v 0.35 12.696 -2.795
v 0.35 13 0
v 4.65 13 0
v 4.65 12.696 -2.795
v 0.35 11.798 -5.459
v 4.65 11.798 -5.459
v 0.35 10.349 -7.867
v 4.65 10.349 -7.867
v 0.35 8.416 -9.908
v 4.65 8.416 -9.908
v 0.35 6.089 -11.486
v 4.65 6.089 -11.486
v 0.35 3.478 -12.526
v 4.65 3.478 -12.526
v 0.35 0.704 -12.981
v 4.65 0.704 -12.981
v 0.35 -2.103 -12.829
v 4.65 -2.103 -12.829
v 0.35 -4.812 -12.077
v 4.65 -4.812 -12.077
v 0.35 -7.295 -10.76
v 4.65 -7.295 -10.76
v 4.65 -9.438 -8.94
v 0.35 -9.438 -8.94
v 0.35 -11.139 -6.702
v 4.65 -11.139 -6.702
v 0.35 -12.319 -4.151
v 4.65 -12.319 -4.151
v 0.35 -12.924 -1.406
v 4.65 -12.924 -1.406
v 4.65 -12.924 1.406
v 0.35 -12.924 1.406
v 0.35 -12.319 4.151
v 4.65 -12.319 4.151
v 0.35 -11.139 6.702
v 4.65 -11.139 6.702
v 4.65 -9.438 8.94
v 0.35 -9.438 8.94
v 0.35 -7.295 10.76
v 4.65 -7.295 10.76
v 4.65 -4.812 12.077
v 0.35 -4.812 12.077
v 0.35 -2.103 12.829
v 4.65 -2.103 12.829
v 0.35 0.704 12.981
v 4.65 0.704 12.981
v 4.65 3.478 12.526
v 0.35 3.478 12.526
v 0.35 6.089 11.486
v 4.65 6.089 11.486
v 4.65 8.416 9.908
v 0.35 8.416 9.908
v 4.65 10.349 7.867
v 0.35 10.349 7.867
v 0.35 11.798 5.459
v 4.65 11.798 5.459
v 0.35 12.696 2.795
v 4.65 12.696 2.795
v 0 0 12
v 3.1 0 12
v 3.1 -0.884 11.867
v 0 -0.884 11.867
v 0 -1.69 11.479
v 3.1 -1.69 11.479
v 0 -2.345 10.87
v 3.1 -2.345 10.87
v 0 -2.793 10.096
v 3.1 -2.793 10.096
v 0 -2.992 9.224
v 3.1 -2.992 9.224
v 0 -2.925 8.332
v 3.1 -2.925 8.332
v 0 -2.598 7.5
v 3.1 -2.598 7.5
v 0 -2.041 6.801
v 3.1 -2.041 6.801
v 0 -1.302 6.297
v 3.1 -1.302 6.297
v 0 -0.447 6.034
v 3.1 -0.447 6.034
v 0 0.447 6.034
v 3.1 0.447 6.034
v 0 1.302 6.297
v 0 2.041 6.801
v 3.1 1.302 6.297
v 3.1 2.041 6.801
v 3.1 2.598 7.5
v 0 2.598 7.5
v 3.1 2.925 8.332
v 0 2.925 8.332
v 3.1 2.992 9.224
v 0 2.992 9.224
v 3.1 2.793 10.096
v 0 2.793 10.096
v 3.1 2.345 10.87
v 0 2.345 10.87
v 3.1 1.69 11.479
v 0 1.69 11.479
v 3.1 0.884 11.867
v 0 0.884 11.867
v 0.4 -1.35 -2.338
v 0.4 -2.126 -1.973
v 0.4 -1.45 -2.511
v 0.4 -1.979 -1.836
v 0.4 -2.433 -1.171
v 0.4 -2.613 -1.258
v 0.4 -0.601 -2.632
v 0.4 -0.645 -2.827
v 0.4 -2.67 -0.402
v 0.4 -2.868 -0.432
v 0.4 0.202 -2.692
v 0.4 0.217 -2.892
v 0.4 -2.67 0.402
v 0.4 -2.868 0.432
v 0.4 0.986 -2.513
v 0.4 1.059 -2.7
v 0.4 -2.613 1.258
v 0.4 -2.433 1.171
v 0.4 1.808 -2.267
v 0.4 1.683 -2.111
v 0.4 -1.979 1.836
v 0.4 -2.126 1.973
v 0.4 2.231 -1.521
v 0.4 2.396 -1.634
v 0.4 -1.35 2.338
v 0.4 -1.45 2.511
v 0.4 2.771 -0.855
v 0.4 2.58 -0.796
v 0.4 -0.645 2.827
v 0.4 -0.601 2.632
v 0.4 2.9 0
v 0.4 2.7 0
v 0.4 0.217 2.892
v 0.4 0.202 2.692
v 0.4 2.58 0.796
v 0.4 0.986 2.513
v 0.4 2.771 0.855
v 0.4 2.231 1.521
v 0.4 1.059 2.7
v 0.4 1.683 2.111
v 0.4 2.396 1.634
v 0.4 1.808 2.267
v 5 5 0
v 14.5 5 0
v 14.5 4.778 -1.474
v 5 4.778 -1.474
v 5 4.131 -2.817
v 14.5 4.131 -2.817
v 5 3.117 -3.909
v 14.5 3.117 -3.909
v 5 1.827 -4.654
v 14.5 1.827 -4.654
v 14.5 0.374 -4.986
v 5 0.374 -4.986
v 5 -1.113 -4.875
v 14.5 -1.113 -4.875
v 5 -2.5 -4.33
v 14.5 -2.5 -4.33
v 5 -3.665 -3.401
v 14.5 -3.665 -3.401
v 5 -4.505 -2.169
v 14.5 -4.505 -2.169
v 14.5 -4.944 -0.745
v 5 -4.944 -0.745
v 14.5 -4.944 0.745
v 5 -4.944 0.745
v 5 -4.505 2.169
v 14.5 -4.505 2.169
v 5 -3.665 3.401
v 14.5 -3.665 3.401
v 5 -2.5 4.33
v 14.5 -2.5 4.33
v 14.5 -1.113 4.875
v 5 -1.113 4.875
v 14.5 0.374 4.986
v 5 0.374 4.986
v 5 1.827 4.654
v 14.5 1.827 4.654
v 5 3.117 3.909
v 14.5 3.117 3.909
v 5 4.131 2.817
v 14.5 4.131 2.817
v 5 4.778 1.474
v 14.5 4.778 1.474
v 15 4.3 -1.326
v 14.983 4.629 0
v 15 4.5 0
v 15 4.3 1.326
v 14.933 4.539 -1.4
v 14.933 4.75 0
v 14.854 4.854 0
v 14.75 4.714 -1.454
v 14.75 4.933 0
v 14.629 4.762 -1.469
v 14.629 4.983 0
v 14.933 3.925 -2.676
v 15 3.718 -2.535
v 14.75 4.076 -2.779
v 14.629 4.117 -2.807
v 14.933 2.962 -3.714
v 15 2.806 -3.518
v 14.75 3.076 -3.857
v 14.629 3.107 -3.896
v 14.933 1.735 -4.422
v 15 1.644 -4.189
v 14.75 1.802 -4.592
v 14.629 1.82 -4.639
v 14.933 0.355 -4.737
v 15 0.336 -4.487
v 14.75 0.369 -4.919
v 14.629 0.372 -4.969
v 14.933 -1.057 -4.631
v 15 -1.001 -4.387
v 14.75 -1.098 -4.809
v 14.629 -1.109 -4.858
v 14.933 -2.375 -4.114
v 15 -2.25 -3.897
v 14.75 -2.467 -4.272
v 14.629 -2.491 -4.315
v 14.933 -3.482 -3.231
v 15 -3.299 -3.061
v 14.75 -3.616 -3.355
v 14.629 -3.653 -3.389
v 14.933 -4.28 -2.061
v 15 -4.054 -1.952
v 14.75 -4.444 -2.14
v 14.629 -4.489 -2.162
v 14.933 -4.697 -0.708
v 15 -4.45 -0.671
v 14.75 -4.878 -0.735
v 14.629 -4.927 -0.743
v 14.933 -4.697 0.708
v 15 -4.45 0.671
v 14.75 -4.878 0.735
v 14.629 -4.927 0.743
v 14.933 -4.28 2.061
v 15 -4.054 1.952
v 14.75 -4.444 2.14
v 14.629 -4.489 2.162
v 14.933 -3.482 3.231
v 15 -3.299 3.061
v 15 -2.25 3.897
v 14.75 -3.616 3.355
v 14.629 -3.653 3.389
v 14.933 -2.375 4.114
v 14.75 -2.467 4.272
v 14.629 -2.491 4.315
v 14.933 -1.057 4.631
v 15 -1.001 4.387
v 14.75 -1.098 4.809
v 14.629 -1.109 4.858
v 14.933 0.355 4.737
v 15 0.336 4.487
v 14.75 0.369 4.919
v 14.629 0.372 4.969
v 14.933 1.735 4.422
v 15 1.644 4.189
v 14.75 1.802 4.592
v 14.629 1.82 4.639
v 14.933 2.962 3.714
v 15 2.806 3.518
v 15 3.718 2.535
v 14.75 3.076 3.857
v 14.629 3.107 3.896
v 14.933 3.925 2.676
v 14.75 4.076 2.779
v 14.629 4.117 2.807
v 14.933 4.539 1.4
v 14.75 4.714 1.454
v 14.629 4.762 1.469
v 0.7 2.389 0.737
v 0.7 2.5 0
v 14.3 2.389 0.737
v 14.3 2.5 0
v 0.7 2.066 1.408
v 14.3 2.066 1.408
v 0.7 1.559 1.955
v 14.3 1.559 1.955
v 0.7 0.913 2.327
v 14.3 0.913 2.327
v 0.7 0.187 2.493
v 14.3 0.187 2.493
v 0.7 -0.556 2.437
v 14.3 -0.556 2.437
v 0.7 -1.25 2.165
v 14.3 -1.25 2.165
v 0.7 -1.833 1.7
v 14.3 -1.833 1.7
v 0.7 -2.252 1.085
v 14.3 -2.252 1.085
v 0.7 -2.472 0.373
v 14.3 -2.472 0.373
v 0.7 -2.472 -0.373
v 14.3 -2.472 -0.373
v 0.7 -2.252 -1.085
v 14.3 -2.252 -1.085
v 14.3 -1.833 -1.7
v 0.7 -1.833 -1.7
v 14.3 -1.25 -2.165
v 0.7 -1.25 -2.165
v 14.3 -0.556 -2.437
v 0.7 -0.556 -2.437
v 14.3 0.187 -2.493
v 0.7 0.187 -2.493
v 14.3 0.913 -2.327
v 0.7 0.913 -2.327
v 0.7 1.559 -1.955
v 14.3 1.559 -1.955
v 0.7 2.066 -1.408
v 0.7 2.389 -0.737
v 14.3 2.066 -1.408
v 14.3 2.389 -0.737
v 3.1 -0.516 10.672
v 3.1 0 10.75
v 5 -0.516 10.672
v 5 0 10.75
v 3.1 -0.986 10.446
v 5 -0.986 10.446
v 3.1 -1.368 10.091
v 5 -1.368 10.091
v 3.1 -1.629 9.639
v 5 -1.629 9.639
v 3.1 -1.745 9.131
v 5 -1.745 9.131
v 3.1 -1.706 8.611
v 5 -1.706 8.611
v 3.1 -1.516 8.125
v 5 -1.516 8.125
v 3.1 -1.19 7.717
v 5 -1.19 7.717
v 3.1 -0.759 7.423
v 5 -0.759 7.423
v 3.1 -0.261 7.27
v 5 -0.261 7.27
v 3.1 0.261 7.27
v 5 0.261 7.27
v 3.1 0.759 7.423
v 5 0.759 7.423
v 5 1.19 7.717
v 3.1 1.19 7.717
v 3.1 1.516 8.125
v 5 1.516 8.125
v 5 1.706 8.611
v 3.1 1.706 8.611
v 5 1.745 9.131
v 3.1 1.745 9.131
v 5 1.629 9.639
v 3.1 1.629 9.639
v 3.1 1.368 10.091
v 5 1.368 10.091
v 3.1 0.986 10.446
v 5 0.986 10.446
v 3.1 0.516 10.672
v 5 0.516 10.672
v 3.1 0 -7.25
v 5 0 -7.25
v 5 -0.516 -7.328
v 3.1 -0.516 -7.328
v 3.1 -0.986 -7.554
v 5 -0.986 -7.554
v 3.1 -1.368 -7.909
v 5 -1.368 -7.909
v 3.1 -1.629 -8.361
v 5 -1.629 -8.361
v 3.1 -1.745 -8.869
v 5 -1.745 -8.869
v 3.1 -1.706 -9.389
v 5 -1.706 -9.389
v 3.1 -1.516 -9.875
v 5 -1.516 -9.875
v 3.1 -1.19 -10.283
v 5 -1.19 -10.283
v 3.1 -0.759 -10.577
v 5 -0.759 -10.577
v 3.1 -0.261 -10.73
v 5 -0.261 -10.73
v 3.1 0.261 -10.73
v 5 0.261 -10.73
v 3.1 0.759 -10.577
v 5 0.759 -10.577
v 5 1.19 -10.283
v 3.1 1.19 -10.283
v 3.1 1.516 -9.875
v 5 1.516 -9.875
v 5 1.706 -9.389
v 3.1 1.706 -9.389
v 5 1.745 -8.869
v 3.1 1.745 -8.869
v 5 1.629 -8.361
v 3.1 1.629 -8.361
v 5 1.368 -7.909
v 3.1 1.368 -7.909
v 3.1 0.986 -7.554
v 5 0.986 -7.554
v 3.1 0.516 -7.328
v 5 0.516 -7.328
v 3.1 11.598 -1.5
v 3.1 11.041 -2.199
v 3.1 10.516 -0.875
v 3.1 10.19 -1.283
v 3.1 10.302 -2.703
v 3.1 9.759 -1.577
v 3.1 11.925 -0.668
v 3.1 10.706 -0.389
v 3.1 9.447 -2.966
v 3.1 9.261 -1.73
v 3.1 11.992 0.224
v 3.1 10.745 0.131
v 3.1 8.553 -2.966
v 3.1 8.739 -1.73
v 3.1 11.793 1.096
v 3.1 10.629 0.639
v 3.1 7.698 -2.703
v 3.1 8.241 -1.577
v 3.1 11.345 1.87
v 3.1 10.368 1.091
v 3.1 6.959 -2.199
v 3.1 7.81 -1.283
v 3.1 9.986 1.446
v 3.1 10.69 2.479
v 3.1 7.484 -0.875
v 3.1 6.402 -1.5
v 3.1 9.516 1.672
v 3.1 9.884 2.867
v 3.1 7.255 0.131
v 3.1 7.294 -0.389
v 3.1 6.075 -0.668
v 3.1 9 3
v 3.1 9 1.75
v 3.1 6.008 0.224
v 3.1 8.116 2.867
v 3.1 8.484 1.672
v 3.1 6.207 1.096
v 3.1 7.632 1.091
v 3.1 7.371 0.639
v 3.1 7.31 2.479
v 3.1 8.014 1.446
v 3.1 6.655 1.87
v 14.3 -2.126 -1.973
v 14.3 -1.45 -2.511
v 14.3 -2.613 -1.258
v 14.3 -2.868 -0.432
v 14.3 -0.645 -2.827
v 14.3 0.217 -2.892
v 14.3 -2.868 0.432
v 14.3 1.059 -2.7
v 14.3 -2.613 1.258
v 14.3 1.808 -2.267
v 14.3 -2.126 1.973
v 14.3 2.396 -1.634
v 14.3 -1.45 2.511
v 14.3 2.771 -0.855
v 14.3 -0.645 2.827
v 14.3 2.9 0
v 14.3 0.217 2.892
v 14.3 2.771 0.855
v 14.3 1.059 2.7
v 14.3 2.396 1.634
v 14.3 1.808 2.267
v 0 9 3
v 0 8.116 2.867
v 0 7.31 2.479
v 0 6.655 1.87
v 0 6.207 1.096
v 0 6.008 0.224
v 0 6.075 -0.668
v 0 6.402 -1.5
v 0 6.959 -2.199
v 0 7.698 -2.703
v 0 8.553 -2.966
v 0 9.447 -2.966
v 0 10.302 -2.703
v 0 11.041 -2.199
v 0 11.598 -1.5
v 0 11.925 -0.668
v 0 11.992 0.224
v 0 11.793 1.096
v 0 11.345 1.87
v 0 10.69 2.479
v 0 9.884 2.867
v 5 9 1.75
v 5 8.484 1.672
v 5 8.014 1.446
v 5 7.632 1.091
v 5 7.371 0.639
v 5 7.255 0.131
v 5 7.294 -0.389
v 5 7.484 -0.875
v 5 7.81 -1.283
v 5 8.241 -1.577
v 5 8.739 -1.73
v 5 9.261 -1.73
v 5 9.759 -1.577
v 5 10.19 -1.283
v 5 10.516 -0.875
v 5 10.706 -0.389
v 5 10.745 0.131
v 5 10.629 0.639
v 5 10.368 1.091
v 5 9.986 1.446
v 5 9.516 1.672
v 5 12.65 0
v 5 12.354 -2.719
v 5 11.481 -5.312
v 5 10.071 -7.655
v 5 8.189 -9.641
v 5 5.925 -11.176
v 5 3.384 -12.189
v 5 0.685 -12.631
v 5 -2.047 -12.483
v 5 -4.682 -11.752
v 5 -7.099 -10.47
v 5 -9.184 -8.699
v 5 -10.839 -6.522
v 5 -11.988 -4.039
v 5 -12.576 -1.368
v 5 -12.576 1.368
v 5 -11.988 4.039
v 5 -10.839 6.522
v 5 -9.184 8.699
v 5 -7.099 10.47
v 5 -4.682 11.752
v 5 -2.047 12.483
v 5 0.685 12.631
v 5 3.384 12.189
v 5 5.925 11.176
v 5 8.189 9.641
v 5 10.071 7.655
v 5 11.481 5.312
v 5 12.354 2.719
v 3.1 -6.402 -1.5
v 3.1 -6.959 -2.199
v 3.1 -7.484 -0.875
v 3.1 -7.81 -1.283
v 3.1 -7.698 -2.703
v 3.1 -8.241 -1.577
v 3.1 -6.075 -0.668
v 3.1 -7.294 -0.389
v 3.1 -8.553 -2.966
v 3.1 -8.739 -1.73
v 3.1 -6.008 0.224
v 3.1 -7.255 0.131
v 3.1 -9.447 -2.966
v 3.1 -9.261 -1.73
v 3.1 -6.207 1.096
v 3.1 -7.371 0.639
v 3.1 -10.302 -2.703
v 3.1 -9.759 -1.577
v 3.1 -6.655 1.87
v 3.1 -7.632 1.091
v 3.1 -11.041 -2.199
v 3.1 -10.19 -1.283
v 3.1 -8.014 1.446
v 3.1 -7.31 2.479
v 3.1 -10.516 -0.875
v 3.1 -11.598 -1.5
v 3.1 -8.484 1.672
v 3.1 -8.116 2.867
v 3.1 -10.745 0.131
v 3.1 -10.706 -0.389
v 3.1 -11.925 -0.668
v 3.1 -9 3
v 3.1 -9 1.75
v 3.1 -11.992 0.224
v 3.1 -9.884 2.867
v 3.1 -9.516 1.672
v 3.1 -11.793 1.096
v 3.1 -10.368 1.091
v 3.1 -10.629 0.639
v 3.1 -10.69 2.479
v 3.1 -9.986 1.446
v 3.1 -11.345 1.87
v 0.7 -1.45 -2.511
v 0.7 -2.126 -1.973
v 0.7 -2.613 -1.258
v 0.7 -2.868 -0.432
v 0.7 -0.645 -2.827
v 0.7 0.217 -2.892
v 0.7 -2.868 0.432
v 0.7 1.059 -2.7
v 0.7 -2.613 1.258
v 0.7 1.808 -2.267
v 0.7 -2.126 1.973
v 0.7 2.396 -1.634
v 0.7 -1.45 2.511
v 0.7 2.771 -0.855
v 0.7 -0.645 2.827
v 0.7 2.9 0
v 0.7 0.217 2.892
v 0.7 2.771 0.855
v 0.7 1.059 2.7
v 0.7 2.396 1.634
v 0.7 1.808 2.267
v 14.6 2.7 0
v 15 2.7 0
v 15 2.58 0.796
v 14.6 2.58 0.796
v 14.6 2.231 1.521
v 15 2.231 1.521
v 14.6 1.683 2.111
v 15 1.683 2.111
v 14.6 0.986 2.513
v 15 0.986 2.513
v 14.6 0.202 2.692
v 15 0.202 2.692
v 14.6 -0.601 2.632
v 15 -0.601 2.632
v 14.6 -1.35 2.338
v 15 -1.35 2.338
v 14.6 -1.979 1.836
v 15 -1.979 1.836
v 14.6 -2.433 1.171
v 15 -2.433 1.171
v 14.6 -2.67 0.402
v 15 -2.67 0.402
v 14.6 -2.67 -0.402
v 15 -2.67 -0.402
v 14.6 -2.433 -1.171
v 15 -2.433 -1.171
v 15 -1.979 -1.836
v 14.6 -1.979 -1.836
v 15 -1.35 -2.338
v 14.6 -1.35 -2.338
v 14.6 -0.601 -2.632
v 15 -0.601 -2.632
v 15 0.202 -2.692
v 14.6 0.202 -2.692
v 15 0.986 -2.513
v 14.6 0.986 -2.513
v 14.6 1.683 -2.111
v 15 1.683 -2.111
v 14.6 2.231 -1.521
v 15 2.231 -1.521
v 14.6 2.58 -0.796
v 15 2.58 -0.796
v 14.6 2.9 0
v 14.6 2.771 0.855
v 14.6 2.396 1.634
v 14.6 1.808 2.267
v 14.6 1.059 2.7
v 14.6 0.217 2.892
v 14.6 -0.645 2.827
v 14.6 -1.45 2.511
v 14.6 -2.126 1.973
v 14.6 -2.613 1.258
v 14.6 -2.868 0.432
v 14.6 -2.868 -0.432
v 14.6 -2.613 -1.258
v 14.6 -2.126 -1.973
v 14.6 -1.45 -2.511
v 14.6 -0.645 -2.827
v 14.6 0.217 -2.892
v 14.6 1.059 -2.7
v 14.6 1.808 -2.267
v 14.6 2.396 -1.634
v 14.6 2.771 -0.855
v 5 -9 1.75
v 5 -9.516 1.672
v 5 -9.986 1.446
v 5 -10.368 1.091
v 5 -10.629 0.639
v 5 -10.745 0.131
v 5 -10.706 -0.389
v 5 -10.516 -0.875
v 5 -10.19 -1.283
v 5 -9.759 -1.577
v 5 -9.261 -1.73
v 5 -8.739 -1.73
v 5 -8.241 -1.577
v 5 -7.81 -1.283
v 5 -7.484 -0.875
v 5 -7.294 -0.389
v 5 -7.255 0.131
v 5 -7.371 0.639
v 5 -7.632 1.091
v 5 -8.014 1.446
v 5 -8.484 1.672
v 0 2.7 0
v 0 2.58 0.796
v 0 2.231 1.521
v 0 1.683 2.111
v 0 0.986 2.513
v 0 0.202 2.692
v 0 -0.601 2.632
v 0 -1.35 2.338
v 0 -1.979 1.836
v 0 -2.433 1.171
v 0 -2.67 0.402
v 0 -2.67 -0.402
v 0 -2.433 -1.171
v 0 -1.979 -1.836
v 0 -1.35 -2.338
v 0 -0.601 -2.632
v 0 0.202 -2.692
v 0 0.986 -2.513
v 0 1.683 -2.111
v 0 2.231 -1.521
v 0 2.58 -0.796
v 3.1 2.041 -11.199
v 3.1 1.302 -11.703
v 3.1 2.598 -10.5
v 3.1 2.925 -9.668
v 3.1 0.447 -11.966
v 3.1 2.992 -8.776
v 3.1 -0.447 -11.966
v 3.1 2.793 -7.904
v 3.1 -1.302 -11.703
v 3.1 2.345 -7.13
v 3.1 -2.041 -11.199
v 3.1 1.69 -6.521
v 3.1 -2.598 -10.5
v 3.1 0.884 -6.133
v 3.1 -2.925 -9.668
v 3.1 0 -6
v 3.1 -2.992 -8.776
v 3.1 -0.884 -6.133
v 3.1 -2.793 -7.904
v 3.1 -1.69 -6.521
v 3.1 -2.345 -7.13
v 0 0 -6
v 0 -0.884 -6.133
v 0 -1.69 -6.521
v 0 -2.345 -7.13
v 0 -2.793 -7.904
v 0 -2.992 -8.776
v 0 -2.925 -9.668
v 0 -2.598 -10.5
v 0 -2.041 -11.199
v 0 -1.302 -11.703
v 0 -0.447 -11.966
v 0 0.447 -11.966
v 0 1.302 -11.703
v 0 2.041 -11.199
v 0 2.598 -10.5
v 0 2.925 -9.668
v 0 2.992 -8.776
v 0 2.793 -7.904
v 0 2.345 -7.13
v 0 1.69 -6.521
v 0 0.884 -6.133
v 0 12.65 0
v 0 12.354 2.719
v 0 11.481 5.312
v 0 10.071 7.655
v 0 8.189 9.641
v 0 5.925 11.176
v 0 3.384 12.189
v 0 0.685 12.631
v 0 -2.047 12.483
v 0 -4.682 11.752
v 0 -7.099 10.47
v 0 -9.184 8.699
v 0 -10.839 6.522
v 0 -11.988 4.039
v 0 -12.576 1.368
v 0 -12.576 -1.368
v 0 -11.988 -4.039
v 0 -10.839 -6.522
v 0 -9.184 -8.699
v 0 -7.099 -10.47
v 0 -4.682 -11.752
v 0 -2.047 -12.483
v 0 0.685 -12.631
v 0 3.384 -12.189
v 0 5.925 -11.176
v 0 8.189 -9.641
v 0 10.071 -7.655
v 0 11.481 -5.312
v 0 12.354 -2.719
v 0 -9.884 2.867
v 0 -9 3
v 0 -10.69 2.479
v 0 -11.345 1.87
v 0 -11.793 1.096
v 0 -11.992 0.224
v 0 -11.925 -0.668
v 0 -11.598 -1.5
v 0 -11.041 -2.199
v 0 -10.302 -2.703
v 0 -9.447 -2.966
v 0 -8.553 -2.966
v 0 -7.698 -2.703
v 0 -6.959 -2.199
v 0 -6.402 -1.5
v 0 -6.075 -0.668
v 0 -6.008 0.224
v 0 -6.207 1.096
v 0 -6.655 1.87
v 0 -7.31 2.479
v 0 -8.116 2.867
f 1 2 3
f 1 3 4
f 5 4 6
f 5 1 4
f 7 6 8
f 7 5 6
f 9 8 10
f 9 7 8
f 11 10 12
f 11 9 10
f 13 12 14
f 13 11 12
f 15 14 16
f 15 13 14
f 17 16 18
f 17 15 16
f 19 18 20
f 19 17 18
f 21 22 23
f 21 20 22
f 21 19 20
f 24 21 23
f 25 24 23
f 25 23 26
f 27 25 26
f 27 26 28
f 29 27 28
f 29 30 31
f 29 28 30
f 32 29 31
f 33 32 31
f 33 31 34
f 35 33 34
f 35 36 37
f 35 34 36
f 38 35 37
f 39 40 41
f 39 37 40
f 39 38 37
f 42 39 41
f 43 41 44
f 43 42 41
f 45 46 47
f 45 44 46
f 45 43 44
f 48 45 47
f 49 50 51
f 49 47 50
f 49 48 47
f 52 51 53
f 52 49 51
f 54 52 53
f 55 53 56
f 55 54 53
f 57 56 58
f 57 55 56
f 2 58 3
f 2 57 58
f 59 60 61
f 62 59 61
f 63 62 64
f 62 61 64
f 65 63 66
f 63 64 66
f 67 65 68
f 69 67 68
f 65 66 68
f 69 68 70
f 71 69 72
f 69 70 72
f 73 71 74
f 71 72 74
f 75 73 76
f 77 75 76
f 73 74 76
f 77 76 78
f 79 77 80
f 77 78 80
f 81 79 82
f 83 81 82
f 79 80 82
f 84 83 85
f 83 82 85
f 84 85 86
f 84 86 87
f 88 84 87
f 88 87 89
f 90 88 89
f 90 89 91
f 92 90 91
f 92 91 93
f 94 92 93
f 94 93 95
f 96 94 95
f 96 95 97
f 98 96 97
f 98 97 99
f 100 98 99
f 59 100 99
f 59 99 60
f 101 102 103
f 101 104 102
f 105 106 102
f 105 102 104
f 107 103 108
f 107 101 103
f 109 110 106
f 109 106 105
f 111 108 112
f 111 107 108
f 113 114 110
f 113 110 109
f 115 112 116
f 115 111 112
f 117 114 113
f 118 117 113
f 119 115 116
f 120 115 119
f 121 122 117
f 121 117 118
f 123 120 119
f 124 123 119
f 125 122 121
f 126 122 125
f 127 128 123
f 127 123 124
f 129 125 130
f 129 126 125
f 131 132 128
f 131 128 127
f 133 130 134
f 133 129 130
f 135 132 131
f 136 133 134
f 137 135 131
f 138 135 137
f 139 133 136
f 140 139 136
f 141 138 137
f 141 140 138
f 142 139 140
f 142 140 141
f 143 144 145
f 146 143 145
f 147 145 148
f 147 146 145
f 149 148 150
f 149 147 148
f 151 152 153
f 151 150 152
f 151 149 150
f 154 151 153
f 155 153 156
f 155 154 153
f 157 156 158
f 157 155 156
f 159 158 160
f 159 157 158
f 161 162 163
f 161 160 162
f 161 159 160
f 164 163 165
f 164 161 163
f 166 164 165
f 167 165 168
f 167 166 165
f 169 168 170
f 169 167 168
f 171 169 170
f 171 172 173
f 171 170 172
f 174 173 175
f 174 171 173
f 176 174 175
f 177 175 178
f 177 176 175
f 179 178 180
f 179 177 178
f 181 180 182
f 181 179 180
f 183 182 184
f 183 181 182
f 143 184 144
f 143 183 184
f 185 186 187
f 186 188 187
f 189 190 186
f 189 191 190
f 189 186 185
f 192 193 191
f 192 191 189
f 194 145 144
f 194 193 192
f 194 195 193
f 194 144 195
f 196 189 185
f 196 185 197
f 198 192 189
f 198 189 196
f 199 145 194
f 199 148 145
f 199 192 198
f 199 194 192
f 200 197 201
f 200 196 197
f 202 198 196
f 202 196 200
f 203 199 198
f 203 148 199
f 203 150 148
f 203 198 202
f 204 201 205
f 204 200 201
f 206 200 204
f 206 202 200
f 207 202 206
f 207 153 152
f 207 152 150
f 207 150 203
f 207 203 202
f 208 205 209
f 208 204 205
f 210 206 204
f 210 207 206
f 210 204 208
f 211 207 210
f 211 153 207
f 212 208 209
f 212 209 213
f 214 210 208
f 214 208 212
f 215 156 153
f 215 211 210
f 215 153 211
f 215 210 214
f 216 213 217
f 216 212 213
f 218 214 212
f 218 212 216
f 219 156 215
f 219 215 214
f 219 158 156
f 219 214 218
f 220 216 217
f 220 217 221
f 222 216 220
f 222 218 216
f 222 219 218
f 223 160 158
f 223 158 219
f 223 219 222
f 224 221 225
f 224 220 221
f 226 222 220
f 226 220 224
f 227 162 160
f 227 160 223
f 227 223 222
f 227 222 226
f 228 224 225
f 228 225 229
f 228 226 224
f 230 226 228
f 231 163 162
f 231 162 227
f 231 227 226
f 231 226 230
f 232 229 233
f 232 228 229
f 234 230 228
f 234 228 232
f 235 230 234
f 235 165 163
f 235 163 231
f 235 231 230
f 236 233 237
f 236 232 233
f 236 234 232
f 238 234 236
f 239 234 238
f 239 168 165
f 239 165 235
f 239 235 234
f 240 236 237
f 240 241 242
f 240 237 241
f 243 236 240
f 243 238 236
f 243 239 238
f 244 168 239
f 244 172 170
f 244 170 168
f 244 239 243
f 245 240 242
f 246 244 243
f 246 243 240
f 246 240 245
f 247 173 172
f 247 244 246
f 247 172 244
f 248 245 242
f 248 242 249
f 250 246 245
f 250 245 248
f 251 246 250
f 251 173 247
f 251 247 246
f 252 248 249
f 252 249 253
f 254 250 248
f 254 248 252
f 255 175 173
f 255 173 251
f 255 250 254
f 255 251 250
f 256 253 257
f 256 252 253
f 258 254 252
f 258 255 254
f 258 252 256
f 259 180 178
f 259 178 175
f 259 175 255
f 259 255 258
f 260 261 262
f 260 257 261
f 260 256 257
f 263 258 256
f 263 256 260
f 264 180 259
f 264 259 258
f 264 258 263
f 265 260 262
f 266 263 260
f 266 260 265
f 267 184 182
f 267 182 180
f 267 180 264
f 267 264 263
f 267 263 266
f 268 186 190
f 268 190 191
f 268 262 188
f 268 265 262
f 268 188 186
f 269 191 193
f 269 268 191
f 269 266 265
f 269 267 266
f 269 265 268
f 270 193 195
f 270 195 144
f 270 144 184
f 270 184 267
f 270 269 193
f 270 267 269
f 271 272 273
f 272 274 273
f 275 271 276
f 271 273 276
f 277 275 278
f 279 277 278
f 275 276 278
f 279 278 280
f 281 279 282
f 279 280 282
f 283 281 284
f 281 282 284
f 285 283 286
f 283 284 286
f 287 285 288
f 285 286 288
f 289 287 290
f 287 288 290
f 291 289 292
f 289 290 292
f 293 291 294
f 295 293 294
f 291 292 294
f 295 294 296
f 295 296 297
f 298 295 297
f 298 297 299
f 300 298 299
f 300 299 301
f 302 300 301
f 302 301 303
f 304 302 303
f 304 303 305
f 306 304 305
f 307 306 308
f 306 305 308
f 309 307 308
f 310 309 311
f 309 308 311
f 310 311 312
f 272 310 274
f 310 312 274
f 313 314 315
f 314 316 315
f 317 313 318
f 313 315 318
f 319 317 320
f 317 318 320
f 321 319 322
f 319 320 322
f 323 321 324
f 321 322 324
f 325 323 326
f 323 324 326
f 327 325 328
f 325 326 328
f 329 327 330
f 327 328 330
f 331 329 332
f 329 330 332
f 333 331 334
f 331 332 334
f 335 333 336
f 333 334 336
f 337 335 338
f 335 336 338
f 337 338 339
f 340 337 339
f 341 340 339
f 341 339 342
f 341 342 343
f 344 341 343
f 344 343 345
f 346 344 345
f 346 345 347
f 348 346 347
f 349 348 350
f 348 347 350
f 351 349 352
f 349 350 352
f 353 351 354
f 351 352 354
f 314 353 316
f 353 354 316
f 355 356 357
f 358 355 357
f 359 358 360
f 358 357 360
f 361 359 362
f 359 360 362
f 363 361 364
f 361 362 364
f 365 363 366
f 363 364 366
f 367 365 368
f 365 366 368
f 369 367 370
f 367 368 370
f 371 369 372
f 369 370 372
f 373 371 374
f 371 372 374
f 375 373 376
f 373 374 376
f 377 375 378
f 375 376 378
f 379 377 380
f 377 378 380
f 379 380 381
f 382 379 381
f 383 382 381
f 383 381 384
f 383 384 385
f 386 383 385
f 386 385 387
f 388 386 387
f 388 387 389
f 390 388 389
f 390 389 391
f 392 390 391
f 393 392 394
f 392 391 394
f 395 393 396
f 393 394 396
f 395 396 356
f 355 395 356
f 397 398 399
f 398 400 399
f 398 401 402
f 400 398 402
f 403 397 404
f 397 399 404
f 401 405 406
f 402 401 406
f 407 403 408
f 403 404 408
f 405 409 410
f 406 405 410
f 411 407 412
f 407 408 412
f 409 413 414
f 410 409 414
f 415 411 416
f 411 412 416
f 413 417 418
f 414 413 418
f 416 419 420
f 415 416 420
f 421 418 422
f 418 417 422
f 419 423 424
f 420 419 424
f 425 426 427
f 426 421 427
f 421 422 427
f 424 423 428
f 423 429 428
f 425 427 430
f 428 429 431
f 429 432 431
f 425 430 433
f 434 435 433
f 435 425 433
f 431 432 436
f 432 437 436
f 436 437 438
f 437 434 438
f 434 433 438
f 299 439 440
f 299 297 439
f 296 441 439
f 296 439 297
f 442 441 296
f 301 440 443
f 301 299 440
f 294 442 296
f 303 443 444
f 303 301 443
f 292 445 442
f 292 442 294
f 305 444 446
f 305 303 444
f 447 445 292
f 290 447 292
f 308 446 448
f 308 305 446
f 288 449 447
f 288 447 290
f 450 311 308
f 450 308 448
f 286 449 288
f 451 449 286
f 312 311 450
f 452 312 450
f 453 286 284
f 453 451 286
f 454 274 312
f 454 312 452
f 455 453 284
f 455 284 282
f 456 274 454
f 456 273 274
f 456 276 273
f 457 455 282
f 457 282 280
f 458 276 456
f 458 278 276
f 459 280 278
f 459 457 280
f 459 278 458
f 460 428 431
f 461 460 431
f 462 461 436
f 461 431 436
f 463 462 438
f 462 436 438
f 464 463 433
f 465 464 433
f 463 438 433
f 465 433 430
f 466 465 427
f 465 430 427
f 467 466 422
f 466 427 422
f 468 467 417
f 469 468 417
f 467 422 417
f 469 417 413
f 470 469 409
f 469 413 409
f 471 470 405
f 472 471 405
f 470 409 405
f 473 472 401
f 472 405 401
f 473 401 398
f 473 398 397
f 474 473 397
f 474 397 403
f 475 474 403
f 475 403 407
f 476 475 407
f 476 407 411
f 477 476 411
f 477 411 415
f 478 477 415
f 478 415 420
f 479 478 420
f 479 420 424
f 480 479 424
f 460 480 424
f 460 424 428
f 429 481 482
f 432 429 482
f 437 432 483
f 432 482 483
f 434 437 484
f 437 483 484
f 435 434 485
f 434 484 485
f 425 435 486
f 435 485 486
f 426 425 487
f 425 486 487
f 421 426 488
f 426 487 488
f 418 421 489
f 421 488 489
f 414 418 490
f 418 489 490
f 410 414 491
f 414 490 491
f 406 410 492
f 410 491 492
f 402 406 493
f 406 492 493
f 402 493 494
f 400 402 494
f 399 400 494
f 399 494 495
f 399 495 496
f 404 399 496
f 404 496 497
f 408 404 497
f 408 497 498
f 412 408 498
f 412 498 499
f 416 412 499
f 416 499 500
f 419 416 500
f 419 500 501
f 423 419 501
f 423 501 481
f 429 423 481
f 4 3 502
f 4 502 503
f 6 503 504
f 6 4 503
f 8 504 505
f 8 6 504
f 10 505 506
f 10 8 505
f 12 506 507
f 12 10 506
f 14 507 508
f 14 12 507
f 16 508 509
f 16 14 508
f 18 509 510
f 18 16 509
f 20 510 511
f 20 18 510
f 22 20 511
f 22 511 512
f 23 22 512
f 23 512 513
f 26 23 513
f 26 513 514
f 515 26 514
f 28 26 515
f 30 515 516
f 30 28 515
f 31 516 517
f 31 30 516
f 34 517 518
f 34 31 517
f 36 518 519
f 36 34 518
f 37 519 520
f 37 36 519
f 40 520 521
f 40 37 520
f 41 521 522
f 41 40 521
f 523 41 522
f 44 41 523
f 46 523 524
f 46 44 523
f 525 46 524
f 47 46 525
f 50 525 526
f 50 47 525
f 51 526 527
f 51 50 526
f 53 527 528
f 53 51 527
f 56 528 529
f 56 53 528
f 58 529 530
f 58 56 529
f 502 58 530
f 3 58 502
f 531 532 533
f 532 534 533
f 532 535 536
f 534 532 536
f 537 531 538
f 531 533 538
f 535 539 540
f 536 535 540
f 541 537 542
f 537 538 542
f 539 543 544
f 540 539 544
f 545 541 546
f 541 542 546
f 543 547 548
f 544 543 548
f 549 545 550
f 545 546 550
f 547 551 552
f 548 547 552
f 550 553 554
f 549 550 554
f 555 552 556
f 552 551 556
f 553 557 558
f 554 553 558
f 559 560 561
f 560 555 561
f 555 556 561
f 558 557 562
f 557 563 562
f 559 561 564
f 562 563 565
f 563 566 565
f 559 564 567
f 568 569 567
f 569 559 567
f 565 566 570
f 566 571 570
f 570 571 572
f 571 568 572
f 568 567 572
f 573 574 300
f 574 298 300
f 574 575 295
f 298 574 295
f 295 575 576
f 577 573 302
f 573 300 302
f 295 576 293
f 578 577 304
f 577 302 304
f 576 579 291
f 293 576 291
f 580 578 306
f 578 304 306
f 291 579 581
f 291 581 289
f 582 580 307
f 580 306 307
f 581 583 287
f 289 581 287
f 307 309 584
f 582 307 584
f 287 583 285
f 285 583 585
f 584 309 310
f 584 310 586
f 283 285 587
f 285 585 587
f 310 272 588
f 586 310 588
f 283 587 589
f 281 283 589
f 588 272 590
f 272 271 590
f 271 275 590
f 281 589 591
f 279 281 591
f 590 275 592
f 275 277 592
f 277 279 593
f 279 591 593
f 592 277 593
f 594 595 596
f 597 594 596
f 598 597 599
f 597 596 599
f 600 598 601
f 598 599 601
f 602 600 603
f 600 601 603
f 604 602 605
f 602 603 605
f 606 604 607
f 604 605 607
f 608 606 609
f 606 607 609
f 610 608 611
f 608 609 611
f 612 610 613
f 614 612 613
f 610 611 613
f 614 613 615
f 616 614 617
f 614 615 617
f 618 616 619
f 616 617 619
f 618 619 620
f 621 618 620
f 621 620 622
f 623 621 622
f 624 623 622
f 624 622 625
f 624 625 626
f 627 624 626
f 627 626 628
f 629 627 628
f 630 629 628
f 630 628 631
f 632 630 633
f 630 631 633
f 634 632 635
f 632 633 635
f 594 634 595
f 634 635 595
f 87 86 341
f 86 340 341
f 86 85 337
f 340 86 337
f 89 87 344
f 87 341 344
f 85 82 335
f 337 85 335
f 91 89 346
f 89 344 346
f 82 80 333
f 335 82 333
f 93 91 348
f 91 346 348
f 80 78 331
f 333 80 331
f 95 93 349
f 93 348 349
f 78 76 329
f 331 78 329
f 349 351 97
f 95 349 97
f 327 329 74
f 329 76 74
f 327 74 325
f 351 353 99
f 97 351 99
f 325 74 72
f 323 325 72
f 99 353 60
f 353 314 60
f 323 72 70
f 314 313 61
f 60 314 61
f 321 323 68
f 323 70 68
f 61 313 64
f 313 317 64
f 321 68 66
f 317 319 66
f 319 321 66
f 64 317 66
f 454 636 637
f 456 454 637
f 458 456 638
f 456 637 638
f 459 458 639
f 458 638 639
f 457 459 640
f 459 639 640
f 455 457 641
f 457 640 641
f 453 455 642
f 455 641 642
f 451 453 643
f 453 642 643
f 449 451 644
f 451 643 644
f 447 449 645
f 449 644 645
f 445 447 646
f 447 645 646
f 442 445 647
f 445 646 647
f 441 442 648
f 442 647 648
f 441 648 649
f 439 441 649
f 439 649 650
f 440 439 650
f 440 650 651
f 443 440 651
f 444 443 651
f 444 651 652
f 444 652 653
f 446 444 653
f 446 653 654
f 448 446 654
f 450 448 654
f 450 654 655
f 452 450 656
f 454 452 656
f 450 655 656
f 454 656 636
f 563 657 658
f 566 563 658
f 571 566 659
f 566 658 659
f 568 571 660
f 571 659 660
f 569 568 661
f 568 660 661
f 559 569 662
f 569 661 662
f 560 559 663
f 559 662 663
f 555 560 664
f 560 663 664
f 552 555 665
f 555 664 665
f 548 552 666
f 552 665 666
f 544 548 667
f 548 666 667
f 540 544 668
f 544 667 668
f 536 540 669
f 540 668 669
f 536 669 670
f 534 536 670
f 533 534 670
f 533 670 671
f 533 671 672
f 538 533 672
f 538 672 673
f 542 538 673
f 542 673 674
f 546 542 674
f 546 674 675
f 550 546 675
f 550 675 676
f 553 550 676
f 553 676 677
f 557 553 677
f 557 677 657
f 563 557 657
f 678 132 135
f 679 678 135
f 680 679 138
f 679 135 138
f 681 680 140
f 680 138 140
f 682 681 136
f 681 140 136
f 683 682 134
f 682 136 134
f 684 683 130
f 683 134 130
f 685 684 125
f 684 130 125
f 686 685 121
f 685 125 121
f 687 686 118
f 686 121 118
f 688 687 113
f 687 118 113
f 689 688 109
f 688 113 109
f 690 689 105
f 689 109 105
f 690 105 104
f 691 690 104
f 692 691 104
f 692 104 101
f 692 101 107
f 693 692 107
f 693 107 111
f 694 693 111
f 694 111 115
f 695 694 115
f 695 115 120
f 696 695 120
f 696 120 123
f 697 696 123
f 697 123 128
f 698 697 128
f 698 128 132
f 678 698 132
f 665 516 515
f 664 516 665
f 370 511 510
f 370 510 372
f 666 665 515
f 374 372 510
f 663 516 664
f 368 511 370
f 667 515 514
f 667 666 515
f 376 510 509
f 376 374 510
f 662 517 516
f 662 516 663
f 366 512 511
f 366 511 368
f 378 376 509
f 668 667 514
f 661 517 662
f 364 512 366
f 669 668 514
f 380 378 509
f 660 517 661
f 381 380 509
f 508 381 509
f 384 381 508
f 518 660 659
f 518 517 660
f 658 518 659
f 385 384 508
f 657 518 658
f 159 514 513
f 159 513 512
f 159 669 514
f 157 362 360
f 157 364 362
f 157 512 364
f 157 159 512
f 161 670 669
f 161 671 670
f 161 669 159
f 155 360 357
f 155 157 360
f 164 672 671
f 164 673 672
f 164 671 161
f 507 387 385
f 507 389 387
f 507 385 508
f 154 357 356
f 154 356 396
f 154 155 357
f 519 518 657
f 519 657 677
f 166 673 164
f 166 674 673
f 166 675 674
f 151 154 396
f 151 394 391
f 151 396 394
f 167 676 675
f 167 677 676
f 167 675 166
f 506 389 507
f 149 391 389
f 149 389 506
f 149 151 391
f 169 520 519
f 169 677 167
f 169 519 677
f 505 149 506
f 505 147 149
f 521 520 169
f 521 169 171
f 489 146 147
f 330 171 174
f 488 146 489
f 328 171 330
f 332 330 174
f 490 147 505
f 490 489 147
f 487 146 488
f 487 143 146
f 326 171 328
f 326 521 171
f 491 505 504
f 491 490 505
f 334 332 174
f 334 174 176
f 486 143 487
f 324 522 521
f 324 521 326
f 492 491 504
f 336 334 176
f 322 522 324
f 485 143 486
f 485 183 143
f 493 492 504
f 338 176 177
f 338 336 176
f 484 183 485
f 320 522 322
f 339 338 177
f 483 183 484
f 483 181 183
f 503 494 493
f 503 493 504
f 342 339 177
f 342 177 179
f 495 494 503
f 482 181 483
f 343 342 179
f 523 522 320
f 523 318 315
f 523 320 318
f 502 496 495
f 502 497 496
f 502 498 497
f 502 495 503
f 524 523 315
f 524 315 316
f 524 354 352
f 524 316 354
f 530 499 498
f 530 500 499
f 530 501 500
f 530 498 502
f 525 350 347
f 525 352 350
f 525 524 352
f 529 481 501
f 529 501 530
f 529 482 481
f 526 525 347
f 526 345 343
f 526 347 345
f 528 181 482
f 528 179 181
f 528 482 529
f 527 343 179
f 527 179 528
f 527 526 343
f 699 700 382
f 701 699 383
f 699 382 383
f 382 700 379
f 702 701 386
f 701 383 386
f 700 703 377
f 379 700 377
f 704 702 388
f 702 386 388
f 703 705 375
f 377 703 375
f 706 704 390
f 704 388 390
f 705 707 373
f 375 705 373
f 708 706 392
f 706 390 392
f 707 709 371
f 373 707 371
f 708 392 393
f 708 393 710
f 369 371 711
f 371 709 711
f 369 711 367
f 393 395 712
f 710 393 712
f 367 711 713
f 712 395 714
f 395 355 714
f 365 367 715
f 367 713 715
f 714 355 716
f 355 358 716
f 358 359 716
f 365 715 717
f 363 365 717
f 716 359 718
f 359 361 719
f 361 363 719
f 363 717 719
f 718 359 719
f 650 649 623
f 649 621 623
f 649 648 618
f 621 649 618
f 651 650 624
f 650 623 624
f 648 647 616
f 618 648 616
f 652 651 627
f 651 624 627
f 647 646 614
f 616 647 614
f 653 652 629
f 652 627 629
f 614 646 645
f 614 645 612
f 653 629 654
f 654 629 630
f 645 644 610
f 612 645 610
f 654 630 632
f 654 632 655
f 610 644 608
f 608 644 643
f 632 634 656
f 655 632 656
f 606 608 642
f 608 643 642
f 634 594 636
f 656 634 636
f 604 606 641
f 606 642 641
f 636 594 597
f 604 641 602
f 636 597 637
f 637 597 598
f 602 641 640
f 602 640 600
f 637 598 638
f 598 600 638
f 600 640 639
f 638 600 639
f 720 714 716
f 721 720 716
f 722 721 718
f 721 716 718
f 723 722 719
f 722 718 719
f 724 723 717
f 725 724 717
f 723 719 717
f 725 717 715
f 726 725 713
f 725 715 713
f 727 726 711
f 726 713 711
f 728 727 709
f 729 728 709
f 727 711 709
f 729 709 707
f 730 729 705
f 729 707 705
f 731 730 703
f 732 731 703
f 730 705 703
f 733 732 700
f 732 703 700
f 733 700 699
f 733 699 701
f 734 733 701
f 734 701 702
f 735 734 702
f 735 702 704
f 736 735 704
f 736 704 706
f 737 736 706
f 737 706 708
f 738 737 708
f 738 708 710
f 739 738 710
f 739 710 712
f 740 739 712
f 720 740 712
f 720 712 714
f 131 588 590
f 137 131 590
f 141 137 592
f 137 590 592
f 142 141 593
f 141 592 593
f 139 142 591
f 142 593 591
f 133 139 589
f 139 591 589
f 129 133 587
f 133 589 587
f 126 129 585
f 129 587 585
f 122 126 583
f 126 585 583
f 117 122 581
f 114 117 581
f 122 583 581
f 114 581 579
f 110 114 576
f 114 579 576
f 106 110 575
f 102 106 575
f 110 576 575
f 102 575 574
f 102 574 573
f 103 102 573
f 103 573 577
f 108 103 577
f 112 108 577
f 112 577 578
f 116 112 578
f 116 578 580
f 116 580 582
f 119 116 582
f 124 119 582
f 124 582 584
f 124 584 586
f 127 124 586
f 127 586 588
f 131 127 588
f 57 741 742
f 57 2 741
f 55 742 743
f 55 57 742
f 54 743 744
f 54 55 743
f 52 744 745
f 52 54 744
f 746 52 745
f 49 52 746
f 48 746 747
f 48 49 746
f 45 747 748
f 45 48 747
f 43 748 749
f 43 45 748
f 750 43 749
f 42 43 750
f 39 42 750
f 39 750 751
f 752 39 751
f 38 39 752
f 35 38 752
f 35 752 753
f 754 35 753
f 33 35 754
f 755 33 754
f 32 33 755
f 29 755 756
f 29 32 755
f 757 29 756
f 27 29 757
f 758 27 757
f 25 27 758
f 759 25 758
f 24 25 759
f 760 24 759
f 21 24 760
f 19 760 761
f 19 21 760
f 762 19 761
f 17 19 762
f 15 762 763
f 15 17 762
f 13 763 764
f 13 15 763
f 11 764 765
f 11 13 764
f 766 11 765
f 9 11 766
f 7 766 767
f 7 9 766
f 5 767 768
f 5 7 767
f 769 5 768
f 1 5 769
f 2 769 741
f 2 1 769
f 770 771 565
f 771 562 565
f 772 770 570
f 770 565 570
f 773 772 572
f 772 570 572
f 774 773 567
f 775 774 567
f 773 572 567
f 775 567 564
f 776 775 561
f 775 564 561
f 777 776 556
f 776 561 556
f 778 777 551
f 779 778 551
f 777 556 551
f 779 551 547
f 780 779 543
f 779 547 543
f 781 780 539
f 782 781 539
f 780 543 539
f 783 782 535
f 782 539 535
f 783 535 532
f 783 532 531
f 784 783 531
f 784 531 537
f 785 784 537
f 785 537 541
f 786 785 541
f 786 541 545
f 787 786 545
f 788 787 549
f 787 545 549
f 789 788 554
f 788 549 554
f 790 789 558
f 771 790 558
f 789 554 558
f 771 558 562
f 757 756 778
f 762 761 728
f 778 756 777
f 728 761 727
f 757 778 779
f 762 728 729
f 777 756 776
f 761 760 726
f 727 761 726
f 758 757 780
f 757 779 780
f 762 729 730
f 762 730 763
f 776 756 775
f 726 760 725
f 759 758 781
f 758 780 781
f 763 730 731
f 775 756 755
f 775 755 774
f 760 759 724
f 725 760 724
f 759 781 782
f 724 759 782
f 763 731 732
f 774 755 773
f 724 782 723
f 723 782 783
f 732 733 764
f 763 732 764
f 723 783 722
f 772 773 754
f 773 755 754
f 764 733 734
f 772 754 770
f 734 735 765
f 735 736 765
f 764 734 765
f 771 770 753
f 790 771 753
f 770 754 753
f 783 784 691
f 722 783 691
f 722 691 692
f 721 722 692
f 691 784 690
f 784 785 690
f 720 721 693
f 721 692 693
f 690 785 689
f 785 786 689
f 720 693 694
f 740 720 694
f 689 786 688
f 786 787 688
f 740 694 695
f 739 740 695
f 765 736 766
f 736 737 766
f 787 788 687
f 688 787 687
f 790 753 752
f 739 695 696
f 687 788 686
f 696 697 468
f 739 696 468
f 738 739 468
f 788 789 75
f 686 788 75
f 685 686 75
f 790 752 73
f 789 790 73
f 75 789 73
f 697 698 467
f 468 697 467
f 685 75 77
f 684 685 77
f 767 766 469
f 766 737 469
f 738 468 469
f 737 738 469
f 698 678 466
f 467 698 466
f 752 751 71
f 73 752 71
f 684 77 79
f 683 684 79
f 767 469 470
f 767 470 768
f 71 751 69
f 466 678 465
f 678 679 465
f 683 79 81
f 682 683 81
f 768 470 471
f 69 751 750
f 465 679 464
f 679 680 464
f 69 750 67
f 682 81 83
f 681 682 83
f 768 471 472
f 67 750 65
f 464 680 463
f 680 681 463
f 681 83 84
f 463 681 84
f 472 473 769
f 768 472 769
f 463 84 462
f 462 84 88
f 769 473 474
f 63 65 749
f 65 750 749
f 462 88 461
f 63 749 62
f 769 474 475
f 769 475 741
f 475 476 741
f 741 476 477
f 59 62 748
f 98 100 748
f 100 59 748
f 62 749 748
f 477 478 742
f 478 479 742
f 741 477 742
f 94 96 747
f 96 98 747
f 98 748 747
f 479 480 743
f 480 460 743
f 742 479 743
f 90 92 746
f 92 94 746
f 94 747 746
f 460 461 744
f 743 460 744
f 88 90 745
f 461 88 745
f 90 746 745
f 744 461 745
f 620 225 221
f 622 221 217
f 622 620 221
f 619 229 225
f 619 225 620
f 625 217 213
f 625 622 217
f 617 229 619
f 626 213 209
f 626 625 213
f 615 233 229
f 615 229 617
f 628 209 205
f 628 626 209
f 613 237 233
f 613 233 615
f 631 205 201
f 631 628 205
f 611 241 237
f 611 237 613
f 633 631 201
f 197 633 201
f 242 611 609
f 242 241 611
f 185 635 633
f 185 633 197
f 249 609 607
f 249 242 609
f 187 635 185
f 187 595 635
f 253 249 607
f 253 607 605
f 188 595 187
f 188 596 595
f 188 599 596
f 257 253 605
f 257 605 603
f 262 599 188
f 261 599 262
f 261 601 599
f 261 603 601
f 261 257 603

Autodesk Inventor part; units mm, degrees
sketch "Sketch_1" plane through (0, 0, 0) normal (0, 0, 1) x (1, 0, 0)
  line L0 (15, 0) -> (0, 0)
  line L1 (0, 2.7) -> (0.4, 2.7)
  line L2 (0.4, 2.7) -> (0.4, 2.9)
  line L3 (0.4, 2.9) -> (0.7, 2.9)
  line L4 (0.7, 2.9) -> (0.7, 2.5)
  line L5 (0.7, 2.5) -> (14.3, 2.5)
  line L6 (14.3, 2.5) -> (14.3, 2.9)
  line L7 (14.3, 2.9) -> (14.6, 2.9)
  line L8 (14.6, 2.9) -> (14.6, 2.7)
  line L9 (14.6, 2.7) -> (15, 2.7)
  line L10 (15, 2.7) -> (15, 4.5)
  arc A0 (15, 4.5) -> (14.5, 5) centre (14.5, 4.5) ccw
  line L11 (14.5, 5) -> (5, 5)
  line L12 (5, 5) -> (5, 12.65)
  line L13 (5, 12.65) -> (4.65, 13)
  line L14 (4.65, 13) -> (0.35, 13)
  line L15 (0.35, 13) -> (0, 12.65)
  line L16 (0, 12.65) -> (0, 2.7)
revolve "Revolution1" add sketch "Sketch_1" angle 360 about axis through (15, 0, 0) along (1, 0, 0)
sketch "Sketch2" plane through (0, 0, 0) normal (-1, 0, 0) x (0, 0, 1)
  point P0 (0, 9)
hole "Hole1" at (0, 9, 0) direction (1, 0, 0) diameter 3.5 depth 5 counterbore diameter 6 counterbore depth 3.1
sketch "Sketch3" plane through (0, 0, 0) normal (-1, 0, 0) x (0, 0, 1)
  point P0 (0, -9)
hole "Hole2" at (0, -9, 0) direction (1, 0, 0) diameter 3.5 depth 5 counterbore diameter 6 counterbore depth 3.1
sketch "Sketch4" plane through (0, 0, 0) normal (-1, 0, 0) x (0, 0, 1)
  point P0 (-9, 0)
hole "Hole3" at (0, 0, -9) direction (1, 0, 0) diameter 3.5 depth 5 counterbore diameter 6 counterbore depth 3.1
sketch "Sketch5" plane through (0, 0, 0) normal (-1, 0, 0) x (0, 0, 1)
  point P0 (9, 0)
hole "Hole4" at (0, 0, 9) direction (1, 0, 0) diameter 3.5 depth 5 counterbore diameter 6 counterbore depth 3.1
ref_plane "Combination_Module_XY" through (0, 0, 0) normal (1, 0, 0) x (0, 0, -1)
ref_plane "Combination_Module_YZ" through (0, 0, 0) normal (0, 0, -1) x (0, 1, 0)
ref_plane "Combination_Module_ZX" through (0, 0, 0) normal (0, 1, 0) x (1, 0, 0)
properties part number "C-LHFR5"
